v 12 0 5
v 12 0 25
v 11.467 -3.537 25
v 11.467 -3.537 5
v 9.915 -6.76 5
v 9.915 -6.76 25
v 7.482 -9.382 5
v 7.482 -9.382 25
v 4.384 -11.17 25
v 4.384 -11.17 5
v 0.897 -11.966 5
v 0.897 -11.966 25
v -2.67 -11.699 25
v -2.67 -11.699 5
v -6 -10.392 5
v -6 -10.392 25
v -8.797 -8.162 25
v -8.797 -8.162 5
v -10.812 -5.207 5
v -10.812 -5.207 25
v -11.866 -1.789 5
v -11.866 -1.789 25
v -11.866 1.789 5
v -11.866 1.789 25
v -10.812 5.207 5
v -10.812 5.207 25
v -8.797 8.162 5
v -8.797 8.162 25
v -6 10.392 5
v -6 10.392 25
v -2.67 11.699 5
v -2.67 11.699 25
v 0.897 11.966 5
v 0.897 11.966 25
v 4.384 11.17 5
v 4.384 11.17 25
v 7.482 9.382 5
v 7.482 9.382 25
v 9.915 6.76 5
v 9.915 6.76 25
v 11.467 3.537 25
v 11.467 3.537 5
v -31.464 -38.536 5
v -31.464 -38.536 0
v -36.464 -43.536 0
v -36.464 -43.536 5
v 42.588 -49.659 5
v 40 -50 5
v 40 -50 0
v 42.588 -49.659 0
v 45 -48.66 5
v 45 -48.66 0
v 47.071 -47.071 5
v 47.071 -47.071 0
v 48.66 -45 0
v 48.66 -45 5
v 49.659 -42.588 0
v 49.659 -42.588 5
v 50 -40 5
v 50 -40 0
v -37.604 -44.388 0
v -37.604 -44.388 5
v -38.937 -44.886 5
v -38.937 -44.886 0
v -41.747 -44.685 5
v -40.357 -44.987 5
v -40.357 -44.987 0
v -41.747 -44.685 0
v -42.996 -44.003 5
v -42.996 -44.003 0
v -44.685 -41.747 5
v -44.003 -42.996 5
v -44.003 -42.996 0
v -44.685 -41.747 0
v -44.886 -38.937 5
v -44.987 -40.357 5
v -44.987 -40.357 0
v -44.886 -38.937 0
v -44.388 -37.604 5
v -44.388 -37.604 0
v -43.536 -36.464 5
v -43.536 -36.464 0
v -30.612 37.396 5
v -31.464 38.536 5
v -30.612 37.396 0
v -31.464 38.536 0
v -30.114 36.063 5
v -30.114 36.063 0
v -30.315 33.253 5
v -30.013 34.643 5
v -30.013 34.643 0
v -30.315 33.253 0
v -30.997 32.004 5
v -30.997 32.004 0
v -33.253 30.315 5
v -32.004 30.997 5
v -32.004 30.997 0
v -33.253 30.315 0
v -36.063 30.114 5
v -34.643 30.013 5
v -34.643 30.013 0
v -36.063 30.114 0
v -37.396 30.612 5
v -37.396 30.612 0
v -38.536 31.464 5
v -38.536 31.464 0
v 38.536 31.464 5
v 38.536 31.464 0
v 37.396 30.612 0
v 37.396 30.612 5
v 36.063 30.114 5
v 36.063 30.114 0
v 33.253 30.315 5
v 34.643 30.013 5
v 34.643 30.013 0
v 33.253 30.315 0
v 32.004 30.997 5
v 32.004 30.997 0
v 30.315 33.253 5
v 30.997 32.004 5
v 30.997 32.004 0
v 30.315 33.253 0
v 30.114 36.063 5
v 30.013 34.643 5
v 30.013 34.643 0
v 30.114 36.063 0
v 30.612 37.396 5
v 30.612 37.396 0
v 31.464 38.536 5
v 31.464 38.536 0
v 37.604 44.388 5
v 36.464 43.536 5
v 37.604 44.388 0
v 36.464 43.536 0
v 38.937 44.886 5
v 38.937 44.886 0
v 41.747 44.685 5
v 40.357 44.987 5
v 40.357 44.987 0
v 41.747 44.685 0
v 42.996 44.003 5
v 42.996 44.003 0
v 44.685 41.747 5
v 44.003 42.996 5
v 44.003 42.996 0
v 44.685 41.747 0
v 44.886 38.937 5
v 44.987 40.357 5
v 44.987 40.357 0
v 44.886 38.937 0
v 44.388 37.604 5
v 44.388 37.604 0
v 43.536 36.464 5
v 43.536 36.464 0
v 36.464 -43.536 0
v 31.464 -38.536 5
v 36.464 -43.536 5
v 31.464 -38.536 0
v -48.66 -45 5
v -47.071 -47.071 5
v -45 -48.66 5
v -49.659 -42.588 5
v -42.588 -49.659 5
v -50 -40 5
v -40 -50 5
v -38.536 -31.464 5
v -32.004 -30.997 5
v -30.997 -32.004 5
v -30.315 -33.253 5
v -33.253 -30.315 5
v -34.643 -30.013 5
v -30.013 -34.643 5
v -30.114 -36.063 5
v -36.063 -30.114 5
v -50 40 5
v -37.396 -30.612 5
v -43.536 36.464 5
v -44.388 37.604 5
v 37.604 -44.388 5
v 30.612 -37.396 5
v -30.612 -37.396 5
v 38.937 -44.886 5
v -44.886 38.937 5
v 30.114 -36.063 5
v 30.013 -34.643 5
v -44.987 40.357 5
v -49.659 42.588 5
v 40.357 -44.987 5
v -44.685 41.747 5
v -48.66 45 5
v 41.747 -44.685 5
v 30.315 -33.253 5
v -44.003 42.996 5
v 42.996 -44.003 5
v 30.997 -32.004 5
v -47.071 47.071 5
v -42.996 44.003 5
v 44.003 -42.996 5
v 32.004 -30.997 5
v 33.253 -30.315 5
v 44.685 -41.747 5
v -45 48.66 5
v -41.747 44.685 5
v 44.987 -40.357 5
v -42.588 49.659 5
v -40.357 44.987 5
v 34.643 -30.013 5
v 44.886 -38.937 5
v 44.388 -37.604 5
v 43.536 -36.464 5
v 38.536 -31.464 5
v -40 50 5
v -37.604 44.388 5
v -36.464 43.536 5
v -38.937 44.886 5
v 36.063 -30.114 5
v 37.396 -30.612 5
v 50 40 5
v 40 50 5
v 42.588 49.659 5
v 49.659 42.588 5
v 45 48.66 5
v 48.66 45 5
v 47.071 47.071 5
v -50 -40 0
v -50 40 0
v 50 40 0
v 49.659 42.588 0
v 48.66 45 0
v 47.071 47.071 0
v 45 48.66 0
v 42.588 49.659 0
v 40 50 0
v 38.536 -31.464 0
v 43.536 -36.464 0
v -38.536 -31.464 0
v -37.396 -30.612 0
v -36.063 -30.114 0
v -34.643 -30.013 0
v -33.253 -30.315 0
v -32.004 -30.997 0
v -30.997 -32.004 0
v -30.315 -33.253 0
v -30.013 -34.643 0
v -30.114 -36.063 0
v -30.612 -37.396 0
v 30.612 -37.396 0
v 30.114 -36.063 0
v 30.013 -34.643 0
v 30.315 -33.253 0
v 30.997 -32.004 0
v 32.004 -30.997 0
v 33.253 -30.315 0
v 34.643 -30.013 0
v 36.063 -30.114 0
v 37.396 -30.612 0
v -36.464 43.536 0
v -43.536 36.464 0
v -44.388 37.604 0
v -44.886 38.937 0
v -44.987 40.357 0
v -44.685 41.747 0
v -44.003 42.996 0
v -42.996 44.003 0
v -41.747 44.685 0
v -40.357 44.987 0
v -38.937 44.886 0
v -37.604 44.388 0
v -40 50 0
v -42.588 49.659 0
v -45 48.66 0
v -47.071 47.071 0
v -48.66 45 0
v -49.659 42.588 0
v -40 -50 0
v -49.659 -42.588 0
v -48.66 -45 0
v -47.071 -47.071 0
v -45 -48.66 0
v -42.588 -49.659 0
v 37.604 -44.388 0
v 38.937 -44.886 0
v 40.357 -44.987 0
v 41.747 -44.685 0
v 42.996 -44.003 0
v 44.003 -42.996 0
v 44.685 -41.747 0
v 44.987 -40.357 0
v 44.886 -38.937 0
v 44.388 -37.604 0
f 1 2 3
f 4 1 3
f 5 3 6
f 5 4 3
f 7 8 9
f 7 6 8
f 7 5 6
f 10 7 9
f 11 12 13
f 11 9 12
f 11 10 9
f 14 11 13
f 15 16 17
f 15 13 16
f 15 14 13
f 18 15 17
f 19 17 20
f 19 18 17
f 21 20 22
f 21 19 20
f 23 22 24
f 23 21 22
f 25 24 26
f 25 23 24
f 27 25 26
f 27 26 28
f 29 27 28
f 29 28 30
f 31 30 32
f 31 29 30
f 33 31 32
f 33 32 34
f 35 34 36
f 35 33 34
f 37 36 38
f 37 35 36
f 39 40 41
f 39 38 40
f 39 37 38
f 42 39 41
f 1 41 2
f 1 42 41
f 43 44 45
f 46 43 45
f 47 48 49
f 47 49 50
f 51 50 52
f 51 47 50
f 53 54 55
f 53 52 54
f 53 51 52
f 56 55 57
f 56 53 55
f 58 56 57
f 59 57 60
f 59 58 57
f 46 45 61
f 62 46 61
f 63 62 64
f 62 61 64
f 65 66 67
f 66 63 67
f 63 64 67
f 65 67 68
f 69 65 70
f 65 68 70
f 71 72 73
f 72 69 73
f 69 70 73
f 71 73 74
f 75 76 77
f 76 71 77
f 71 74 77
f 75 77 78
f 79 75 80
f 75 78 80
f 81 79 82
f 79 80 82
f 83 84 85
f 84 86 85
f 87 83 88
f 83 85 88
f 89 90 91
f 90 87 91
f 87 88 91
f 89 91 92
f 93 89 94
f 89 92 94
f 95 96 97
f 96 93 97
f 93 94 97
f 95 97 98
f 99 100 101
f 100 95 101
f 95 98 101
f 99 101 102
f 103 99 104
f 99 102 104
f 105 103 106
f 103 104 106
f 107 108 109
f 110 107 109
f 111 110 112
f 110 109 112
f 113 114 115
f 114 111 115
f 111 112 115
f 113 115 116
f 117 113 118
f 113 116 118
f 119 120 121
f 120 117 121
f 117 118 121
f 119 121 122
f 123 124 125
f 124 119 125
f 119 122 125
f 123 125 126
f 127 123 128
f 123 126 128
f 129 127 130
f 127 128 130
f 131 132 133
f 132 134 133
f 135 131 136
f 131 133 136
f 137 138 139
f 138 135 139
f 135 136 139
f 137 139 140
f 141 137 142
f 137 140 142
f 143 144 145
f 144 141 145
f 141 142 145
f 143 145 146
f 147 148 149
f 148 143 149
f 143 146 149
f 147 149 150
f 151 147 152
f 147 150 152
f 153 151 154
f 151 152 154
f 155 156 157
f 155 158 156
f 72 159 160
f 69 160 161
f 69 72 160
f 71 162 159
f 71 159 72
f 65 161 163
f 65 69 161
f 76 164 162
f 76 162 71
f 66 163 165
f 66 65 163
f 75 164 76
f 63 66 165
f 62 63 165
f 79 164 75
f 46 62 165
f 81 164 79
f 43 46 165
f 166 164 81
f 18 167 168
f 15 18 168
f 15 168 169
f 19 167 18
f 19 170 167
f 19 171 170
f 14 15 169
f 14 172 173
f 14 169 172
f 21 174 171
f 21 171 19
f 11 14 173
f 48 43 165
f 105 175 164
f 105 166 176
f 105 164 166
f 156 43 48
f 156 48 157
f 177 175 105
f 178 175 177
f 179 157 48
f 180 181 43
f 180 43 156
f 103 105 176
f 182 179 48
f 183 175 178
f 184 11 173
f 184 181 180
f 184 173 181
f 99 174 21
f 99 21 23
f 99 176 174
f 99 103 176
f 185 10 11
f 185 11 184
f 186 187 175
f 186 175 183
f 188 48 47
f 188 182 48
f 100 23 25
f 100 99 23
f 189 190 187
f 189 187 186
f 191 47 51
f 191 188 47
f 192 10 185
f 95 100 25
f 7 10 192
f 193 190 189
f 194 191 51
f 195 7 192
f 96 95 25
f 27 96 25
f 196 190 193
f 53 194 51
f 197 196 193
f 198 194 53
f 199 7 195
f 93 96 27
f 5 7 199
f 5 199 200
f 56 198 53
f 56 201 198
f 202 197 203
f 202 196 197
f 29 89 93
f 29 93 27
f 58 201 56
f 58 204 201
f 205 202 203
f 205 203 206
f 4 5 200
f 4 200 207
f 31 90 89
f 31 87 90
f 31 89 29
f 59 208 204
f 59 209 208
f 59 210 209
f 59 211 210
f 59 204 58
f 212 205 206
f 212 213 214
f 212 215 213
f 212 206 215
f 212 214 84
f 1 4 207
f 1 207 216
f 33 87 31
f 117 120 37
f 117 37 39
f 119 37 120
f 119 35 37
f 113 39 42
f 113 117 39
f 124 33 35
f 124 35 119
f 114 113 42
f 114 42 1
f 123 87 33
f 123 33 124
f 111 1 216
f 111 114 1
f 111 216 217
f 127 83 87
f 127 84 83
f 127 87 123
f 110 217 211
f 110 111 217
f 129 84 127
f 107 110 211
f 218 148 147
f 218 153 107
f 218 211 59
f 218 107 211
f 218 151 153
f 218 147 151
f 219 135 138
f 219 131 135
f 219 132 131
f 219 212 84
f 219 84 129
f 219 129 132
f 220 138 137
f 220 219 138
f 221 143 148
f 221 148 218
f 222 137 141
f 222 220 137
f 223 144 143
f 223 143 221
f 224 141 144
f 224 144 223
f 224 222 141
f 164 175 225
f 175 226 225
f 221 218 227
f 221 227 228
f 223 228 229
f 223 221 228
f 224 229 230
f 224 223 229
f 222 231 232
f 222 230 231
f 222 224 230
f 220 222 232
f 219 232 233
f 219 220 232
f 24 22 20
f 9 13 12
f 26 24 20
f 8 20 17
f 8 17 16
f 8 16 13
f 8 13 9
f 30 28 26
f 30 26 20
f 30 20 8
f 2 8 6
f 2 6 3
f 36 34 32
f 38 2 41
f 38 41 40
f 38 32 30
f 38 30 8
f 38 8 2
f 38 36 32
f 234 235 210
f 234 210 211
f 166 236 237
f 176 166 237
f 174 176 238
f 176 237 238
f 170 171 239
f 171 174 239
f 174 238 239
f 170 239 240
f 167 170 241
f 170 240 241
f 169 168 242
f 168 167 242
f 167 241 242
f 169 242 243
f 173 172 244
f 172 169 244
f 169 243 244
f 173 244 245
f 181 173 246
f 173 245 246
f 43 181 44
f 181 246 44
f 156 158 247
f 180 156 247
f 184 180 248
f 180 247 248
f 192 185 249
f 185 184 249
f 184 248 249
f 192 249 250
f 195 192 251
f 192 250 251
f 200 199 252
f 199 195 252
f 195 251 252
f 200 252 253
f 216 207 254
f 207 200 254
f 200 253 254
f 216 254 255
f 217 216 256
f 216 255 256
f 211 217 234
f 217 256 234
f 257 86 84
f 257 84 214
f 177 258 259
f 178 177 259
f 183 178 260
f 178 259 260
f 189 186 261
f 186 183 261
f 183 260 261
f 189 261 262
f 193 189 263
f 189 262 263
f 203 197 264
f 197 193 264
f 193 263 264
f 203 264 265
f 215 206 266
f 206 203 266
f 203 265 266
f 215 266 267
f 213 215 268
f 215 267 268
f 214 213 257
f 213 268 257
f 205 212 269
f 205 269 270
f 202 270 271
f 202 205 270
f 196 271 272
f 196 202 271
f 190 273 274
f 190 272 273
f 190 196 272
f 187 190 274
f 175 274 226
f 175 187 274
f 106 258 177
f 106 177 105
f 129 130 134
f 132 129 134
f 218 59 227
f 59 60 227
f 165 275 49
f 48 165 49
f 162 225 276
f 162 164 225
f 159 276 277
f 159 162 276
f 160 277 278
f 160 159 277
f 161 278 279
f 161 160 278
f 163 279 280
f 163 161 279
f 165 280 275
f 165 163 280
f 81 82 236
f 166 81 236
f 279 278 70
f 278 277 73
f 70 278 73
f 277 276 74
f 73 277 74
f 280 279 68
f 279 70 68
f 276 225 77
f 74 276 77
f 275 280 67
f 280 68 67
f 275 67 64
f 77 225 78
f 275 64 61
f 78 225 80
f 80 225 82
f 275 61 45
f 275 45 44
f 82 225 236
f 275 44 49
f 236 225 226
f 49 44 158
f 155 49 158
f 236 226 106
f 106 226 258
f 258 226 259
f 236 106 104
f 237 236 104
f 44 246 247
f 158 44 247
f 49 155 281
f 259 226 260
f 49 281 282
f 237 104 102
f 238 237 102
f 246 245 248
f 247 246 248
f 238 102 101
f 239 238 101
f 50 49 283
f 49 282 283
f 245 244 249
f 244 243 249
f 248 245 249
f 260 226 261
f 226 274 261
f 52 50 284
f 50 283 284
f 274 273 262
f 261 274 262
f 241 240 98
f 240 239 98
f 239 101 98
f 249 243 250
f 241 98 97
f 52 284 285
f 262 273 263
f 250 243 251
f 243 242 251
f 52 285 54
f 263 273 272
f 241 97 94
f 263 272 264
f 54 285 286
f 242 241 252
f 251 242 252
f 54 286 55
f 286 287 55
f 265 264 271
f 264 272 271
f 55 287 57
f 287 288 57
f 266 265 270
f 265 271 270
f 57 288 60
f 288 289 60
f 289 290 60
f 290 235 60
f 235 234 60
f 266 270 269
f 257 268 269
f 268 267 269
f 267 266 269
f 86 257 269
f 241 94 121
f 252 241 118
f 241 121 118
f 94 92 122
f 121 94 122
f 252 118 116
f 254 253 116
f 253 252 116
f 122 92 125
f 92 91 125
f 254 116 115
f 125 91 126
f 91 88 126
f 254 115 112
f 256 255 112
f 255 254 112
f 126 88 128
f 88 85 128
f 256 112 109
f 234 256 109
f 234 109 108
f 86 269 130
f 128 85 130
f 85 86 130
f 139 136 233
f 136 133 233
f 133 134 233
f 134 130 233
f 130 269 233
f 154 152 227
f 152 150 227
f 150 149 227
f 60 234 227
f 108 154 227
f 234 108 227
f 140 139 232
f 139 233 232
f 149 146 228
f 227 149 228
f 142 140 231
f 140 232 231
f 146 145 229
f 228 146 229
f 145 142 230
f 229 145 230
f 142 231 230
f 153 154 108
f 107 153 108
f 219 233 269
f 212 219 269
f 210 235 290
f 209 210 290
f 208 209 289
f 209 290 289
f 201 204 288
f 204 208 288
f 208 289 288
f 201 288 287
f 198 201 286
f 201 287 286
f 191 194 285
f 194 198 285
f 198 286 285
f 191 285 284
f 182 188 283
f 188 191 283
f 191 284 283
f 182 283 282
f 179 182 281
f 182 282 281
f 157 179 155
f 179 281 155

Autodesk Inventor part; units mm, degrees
ref_plane "YZ Plane" through (0, 0, 0) normal (1, 0, 0) x (0, 1, 0)
ref_plane "XZ Plane" through (0, 0, 0) normal (0, 1, 0) x (-1, 0, 0)
ref_plane "XY Plane" through (0, 0, 0) normal (0, 0, 1) x (1, 0, 0)
sketch "スケッチ1" plane through (0, 0, 0) normal (0, 0, 1) x (1, 0, 0)
  line L0 (-50, -50) -> (50, -50)
  line L1 (50, -50) -> (50, 50)
  line L2 (50, 50) -> (-50, 50)
  line L3 (-50, 50) -> (-50, -50)
  line L4 (-50, -50) -> (50, 50) construction
  line L5 (50, -50) -> (-50, 50) construction
  line L6 (35, 35) -> (40, 40) construction
  line L7 (31.4645, 38.5355) -> (36.4645, 43.5355)
  line L8 (43.5355, 36.4645) -> (38.5355, 31.4645)
  arc A0 (31.4645, 38.5355) -> (38.5355, 31.4645) centre (35, 35) ccw
  arc A1 (43.5355, 36.4645) -> (36.4645, 43.5355) centre (40, 40) ccw
  line L9 (-50, 0) -> (50, 0) construction
  line L10 (0, 50) -> (0, -50) construction
  line L11 (-35, 35) -> (-40, 40) construction
  line L12 (-31.4645, 38.5355) -> (-36.4645, 43.5355)
  line L13 (-43.5355, 36.4645) -> (-38.5355, 31.4645)
  arc A2 (-38.5355, 31.4645) -> (-31.4645, 38.5355) centre (-35, 35) ccw
  arc A3 (-36.4645, 43.5355) -> (-43.5355, 36.4645) centre (-40, 40) ccw
  line L14 (35, -35) -> (40, -40) construction
  line L15 (31.4645, -38.5355) -> (36.4645, -43.5355)
  line L16 (43.5355, -36.4645) -> (38.5355, -31.4645)
  arc A4 (38.5355, -31.4645) -> (31.4645, -38.5355) centre (35, -35) ccw
  arc A5 (36.4645, -43.5355) -> (43.5355, -36.4645) centre (40, -40) ccw
  arc A6 (-31.4645, -38.5355) -> (-38.5355, -31.4645) centre (-35, -35) ccw
  line L17 (-43.5355, -36.4645) -> (-38.5355, -31.4645)
  line L18 (-35, -35) -> (-40, -40) construction
  arc A7 (-43.5355, -36.4645) -> (-36.4645, -43.5355) centre (-40, -40) ccw
  line L19 (-31.4645, -38.5355) -> (-36.4645, -43.5355)
  point P0 (0, 0)
  point P1 (37.5, 37.5)
  point P2 (-37.5, 37.5)
  point P3 (37.5, -37.5)
  point P4 (-37.5, -37.5)
  dimension "d0" = 100
  dimension "d1" = 100
  dimension "d2" = 10
  dimension "d3" = 15
  dimension "d4" = 5
extrude "押し出し1" add sketch "スケッチ1" along normal blind 5
fillet "フィレット1" radius 10 4 edges at (50, 50, 2.5) (50, -50, 2.5) (-50, -50, 2.5) (-50, 50, 2.5)
sketch "スケッチ2" plane through (0, 0, 5) normal (0, 0, 1) x (1, 0, 0)
  circle A0 centre (0, 0) radius 12
  dimension "d8" = 24
extrude "押し出し2" add sketch "スケッチ2" along normal blind 20
properties part number "自由輪パーツ2"
